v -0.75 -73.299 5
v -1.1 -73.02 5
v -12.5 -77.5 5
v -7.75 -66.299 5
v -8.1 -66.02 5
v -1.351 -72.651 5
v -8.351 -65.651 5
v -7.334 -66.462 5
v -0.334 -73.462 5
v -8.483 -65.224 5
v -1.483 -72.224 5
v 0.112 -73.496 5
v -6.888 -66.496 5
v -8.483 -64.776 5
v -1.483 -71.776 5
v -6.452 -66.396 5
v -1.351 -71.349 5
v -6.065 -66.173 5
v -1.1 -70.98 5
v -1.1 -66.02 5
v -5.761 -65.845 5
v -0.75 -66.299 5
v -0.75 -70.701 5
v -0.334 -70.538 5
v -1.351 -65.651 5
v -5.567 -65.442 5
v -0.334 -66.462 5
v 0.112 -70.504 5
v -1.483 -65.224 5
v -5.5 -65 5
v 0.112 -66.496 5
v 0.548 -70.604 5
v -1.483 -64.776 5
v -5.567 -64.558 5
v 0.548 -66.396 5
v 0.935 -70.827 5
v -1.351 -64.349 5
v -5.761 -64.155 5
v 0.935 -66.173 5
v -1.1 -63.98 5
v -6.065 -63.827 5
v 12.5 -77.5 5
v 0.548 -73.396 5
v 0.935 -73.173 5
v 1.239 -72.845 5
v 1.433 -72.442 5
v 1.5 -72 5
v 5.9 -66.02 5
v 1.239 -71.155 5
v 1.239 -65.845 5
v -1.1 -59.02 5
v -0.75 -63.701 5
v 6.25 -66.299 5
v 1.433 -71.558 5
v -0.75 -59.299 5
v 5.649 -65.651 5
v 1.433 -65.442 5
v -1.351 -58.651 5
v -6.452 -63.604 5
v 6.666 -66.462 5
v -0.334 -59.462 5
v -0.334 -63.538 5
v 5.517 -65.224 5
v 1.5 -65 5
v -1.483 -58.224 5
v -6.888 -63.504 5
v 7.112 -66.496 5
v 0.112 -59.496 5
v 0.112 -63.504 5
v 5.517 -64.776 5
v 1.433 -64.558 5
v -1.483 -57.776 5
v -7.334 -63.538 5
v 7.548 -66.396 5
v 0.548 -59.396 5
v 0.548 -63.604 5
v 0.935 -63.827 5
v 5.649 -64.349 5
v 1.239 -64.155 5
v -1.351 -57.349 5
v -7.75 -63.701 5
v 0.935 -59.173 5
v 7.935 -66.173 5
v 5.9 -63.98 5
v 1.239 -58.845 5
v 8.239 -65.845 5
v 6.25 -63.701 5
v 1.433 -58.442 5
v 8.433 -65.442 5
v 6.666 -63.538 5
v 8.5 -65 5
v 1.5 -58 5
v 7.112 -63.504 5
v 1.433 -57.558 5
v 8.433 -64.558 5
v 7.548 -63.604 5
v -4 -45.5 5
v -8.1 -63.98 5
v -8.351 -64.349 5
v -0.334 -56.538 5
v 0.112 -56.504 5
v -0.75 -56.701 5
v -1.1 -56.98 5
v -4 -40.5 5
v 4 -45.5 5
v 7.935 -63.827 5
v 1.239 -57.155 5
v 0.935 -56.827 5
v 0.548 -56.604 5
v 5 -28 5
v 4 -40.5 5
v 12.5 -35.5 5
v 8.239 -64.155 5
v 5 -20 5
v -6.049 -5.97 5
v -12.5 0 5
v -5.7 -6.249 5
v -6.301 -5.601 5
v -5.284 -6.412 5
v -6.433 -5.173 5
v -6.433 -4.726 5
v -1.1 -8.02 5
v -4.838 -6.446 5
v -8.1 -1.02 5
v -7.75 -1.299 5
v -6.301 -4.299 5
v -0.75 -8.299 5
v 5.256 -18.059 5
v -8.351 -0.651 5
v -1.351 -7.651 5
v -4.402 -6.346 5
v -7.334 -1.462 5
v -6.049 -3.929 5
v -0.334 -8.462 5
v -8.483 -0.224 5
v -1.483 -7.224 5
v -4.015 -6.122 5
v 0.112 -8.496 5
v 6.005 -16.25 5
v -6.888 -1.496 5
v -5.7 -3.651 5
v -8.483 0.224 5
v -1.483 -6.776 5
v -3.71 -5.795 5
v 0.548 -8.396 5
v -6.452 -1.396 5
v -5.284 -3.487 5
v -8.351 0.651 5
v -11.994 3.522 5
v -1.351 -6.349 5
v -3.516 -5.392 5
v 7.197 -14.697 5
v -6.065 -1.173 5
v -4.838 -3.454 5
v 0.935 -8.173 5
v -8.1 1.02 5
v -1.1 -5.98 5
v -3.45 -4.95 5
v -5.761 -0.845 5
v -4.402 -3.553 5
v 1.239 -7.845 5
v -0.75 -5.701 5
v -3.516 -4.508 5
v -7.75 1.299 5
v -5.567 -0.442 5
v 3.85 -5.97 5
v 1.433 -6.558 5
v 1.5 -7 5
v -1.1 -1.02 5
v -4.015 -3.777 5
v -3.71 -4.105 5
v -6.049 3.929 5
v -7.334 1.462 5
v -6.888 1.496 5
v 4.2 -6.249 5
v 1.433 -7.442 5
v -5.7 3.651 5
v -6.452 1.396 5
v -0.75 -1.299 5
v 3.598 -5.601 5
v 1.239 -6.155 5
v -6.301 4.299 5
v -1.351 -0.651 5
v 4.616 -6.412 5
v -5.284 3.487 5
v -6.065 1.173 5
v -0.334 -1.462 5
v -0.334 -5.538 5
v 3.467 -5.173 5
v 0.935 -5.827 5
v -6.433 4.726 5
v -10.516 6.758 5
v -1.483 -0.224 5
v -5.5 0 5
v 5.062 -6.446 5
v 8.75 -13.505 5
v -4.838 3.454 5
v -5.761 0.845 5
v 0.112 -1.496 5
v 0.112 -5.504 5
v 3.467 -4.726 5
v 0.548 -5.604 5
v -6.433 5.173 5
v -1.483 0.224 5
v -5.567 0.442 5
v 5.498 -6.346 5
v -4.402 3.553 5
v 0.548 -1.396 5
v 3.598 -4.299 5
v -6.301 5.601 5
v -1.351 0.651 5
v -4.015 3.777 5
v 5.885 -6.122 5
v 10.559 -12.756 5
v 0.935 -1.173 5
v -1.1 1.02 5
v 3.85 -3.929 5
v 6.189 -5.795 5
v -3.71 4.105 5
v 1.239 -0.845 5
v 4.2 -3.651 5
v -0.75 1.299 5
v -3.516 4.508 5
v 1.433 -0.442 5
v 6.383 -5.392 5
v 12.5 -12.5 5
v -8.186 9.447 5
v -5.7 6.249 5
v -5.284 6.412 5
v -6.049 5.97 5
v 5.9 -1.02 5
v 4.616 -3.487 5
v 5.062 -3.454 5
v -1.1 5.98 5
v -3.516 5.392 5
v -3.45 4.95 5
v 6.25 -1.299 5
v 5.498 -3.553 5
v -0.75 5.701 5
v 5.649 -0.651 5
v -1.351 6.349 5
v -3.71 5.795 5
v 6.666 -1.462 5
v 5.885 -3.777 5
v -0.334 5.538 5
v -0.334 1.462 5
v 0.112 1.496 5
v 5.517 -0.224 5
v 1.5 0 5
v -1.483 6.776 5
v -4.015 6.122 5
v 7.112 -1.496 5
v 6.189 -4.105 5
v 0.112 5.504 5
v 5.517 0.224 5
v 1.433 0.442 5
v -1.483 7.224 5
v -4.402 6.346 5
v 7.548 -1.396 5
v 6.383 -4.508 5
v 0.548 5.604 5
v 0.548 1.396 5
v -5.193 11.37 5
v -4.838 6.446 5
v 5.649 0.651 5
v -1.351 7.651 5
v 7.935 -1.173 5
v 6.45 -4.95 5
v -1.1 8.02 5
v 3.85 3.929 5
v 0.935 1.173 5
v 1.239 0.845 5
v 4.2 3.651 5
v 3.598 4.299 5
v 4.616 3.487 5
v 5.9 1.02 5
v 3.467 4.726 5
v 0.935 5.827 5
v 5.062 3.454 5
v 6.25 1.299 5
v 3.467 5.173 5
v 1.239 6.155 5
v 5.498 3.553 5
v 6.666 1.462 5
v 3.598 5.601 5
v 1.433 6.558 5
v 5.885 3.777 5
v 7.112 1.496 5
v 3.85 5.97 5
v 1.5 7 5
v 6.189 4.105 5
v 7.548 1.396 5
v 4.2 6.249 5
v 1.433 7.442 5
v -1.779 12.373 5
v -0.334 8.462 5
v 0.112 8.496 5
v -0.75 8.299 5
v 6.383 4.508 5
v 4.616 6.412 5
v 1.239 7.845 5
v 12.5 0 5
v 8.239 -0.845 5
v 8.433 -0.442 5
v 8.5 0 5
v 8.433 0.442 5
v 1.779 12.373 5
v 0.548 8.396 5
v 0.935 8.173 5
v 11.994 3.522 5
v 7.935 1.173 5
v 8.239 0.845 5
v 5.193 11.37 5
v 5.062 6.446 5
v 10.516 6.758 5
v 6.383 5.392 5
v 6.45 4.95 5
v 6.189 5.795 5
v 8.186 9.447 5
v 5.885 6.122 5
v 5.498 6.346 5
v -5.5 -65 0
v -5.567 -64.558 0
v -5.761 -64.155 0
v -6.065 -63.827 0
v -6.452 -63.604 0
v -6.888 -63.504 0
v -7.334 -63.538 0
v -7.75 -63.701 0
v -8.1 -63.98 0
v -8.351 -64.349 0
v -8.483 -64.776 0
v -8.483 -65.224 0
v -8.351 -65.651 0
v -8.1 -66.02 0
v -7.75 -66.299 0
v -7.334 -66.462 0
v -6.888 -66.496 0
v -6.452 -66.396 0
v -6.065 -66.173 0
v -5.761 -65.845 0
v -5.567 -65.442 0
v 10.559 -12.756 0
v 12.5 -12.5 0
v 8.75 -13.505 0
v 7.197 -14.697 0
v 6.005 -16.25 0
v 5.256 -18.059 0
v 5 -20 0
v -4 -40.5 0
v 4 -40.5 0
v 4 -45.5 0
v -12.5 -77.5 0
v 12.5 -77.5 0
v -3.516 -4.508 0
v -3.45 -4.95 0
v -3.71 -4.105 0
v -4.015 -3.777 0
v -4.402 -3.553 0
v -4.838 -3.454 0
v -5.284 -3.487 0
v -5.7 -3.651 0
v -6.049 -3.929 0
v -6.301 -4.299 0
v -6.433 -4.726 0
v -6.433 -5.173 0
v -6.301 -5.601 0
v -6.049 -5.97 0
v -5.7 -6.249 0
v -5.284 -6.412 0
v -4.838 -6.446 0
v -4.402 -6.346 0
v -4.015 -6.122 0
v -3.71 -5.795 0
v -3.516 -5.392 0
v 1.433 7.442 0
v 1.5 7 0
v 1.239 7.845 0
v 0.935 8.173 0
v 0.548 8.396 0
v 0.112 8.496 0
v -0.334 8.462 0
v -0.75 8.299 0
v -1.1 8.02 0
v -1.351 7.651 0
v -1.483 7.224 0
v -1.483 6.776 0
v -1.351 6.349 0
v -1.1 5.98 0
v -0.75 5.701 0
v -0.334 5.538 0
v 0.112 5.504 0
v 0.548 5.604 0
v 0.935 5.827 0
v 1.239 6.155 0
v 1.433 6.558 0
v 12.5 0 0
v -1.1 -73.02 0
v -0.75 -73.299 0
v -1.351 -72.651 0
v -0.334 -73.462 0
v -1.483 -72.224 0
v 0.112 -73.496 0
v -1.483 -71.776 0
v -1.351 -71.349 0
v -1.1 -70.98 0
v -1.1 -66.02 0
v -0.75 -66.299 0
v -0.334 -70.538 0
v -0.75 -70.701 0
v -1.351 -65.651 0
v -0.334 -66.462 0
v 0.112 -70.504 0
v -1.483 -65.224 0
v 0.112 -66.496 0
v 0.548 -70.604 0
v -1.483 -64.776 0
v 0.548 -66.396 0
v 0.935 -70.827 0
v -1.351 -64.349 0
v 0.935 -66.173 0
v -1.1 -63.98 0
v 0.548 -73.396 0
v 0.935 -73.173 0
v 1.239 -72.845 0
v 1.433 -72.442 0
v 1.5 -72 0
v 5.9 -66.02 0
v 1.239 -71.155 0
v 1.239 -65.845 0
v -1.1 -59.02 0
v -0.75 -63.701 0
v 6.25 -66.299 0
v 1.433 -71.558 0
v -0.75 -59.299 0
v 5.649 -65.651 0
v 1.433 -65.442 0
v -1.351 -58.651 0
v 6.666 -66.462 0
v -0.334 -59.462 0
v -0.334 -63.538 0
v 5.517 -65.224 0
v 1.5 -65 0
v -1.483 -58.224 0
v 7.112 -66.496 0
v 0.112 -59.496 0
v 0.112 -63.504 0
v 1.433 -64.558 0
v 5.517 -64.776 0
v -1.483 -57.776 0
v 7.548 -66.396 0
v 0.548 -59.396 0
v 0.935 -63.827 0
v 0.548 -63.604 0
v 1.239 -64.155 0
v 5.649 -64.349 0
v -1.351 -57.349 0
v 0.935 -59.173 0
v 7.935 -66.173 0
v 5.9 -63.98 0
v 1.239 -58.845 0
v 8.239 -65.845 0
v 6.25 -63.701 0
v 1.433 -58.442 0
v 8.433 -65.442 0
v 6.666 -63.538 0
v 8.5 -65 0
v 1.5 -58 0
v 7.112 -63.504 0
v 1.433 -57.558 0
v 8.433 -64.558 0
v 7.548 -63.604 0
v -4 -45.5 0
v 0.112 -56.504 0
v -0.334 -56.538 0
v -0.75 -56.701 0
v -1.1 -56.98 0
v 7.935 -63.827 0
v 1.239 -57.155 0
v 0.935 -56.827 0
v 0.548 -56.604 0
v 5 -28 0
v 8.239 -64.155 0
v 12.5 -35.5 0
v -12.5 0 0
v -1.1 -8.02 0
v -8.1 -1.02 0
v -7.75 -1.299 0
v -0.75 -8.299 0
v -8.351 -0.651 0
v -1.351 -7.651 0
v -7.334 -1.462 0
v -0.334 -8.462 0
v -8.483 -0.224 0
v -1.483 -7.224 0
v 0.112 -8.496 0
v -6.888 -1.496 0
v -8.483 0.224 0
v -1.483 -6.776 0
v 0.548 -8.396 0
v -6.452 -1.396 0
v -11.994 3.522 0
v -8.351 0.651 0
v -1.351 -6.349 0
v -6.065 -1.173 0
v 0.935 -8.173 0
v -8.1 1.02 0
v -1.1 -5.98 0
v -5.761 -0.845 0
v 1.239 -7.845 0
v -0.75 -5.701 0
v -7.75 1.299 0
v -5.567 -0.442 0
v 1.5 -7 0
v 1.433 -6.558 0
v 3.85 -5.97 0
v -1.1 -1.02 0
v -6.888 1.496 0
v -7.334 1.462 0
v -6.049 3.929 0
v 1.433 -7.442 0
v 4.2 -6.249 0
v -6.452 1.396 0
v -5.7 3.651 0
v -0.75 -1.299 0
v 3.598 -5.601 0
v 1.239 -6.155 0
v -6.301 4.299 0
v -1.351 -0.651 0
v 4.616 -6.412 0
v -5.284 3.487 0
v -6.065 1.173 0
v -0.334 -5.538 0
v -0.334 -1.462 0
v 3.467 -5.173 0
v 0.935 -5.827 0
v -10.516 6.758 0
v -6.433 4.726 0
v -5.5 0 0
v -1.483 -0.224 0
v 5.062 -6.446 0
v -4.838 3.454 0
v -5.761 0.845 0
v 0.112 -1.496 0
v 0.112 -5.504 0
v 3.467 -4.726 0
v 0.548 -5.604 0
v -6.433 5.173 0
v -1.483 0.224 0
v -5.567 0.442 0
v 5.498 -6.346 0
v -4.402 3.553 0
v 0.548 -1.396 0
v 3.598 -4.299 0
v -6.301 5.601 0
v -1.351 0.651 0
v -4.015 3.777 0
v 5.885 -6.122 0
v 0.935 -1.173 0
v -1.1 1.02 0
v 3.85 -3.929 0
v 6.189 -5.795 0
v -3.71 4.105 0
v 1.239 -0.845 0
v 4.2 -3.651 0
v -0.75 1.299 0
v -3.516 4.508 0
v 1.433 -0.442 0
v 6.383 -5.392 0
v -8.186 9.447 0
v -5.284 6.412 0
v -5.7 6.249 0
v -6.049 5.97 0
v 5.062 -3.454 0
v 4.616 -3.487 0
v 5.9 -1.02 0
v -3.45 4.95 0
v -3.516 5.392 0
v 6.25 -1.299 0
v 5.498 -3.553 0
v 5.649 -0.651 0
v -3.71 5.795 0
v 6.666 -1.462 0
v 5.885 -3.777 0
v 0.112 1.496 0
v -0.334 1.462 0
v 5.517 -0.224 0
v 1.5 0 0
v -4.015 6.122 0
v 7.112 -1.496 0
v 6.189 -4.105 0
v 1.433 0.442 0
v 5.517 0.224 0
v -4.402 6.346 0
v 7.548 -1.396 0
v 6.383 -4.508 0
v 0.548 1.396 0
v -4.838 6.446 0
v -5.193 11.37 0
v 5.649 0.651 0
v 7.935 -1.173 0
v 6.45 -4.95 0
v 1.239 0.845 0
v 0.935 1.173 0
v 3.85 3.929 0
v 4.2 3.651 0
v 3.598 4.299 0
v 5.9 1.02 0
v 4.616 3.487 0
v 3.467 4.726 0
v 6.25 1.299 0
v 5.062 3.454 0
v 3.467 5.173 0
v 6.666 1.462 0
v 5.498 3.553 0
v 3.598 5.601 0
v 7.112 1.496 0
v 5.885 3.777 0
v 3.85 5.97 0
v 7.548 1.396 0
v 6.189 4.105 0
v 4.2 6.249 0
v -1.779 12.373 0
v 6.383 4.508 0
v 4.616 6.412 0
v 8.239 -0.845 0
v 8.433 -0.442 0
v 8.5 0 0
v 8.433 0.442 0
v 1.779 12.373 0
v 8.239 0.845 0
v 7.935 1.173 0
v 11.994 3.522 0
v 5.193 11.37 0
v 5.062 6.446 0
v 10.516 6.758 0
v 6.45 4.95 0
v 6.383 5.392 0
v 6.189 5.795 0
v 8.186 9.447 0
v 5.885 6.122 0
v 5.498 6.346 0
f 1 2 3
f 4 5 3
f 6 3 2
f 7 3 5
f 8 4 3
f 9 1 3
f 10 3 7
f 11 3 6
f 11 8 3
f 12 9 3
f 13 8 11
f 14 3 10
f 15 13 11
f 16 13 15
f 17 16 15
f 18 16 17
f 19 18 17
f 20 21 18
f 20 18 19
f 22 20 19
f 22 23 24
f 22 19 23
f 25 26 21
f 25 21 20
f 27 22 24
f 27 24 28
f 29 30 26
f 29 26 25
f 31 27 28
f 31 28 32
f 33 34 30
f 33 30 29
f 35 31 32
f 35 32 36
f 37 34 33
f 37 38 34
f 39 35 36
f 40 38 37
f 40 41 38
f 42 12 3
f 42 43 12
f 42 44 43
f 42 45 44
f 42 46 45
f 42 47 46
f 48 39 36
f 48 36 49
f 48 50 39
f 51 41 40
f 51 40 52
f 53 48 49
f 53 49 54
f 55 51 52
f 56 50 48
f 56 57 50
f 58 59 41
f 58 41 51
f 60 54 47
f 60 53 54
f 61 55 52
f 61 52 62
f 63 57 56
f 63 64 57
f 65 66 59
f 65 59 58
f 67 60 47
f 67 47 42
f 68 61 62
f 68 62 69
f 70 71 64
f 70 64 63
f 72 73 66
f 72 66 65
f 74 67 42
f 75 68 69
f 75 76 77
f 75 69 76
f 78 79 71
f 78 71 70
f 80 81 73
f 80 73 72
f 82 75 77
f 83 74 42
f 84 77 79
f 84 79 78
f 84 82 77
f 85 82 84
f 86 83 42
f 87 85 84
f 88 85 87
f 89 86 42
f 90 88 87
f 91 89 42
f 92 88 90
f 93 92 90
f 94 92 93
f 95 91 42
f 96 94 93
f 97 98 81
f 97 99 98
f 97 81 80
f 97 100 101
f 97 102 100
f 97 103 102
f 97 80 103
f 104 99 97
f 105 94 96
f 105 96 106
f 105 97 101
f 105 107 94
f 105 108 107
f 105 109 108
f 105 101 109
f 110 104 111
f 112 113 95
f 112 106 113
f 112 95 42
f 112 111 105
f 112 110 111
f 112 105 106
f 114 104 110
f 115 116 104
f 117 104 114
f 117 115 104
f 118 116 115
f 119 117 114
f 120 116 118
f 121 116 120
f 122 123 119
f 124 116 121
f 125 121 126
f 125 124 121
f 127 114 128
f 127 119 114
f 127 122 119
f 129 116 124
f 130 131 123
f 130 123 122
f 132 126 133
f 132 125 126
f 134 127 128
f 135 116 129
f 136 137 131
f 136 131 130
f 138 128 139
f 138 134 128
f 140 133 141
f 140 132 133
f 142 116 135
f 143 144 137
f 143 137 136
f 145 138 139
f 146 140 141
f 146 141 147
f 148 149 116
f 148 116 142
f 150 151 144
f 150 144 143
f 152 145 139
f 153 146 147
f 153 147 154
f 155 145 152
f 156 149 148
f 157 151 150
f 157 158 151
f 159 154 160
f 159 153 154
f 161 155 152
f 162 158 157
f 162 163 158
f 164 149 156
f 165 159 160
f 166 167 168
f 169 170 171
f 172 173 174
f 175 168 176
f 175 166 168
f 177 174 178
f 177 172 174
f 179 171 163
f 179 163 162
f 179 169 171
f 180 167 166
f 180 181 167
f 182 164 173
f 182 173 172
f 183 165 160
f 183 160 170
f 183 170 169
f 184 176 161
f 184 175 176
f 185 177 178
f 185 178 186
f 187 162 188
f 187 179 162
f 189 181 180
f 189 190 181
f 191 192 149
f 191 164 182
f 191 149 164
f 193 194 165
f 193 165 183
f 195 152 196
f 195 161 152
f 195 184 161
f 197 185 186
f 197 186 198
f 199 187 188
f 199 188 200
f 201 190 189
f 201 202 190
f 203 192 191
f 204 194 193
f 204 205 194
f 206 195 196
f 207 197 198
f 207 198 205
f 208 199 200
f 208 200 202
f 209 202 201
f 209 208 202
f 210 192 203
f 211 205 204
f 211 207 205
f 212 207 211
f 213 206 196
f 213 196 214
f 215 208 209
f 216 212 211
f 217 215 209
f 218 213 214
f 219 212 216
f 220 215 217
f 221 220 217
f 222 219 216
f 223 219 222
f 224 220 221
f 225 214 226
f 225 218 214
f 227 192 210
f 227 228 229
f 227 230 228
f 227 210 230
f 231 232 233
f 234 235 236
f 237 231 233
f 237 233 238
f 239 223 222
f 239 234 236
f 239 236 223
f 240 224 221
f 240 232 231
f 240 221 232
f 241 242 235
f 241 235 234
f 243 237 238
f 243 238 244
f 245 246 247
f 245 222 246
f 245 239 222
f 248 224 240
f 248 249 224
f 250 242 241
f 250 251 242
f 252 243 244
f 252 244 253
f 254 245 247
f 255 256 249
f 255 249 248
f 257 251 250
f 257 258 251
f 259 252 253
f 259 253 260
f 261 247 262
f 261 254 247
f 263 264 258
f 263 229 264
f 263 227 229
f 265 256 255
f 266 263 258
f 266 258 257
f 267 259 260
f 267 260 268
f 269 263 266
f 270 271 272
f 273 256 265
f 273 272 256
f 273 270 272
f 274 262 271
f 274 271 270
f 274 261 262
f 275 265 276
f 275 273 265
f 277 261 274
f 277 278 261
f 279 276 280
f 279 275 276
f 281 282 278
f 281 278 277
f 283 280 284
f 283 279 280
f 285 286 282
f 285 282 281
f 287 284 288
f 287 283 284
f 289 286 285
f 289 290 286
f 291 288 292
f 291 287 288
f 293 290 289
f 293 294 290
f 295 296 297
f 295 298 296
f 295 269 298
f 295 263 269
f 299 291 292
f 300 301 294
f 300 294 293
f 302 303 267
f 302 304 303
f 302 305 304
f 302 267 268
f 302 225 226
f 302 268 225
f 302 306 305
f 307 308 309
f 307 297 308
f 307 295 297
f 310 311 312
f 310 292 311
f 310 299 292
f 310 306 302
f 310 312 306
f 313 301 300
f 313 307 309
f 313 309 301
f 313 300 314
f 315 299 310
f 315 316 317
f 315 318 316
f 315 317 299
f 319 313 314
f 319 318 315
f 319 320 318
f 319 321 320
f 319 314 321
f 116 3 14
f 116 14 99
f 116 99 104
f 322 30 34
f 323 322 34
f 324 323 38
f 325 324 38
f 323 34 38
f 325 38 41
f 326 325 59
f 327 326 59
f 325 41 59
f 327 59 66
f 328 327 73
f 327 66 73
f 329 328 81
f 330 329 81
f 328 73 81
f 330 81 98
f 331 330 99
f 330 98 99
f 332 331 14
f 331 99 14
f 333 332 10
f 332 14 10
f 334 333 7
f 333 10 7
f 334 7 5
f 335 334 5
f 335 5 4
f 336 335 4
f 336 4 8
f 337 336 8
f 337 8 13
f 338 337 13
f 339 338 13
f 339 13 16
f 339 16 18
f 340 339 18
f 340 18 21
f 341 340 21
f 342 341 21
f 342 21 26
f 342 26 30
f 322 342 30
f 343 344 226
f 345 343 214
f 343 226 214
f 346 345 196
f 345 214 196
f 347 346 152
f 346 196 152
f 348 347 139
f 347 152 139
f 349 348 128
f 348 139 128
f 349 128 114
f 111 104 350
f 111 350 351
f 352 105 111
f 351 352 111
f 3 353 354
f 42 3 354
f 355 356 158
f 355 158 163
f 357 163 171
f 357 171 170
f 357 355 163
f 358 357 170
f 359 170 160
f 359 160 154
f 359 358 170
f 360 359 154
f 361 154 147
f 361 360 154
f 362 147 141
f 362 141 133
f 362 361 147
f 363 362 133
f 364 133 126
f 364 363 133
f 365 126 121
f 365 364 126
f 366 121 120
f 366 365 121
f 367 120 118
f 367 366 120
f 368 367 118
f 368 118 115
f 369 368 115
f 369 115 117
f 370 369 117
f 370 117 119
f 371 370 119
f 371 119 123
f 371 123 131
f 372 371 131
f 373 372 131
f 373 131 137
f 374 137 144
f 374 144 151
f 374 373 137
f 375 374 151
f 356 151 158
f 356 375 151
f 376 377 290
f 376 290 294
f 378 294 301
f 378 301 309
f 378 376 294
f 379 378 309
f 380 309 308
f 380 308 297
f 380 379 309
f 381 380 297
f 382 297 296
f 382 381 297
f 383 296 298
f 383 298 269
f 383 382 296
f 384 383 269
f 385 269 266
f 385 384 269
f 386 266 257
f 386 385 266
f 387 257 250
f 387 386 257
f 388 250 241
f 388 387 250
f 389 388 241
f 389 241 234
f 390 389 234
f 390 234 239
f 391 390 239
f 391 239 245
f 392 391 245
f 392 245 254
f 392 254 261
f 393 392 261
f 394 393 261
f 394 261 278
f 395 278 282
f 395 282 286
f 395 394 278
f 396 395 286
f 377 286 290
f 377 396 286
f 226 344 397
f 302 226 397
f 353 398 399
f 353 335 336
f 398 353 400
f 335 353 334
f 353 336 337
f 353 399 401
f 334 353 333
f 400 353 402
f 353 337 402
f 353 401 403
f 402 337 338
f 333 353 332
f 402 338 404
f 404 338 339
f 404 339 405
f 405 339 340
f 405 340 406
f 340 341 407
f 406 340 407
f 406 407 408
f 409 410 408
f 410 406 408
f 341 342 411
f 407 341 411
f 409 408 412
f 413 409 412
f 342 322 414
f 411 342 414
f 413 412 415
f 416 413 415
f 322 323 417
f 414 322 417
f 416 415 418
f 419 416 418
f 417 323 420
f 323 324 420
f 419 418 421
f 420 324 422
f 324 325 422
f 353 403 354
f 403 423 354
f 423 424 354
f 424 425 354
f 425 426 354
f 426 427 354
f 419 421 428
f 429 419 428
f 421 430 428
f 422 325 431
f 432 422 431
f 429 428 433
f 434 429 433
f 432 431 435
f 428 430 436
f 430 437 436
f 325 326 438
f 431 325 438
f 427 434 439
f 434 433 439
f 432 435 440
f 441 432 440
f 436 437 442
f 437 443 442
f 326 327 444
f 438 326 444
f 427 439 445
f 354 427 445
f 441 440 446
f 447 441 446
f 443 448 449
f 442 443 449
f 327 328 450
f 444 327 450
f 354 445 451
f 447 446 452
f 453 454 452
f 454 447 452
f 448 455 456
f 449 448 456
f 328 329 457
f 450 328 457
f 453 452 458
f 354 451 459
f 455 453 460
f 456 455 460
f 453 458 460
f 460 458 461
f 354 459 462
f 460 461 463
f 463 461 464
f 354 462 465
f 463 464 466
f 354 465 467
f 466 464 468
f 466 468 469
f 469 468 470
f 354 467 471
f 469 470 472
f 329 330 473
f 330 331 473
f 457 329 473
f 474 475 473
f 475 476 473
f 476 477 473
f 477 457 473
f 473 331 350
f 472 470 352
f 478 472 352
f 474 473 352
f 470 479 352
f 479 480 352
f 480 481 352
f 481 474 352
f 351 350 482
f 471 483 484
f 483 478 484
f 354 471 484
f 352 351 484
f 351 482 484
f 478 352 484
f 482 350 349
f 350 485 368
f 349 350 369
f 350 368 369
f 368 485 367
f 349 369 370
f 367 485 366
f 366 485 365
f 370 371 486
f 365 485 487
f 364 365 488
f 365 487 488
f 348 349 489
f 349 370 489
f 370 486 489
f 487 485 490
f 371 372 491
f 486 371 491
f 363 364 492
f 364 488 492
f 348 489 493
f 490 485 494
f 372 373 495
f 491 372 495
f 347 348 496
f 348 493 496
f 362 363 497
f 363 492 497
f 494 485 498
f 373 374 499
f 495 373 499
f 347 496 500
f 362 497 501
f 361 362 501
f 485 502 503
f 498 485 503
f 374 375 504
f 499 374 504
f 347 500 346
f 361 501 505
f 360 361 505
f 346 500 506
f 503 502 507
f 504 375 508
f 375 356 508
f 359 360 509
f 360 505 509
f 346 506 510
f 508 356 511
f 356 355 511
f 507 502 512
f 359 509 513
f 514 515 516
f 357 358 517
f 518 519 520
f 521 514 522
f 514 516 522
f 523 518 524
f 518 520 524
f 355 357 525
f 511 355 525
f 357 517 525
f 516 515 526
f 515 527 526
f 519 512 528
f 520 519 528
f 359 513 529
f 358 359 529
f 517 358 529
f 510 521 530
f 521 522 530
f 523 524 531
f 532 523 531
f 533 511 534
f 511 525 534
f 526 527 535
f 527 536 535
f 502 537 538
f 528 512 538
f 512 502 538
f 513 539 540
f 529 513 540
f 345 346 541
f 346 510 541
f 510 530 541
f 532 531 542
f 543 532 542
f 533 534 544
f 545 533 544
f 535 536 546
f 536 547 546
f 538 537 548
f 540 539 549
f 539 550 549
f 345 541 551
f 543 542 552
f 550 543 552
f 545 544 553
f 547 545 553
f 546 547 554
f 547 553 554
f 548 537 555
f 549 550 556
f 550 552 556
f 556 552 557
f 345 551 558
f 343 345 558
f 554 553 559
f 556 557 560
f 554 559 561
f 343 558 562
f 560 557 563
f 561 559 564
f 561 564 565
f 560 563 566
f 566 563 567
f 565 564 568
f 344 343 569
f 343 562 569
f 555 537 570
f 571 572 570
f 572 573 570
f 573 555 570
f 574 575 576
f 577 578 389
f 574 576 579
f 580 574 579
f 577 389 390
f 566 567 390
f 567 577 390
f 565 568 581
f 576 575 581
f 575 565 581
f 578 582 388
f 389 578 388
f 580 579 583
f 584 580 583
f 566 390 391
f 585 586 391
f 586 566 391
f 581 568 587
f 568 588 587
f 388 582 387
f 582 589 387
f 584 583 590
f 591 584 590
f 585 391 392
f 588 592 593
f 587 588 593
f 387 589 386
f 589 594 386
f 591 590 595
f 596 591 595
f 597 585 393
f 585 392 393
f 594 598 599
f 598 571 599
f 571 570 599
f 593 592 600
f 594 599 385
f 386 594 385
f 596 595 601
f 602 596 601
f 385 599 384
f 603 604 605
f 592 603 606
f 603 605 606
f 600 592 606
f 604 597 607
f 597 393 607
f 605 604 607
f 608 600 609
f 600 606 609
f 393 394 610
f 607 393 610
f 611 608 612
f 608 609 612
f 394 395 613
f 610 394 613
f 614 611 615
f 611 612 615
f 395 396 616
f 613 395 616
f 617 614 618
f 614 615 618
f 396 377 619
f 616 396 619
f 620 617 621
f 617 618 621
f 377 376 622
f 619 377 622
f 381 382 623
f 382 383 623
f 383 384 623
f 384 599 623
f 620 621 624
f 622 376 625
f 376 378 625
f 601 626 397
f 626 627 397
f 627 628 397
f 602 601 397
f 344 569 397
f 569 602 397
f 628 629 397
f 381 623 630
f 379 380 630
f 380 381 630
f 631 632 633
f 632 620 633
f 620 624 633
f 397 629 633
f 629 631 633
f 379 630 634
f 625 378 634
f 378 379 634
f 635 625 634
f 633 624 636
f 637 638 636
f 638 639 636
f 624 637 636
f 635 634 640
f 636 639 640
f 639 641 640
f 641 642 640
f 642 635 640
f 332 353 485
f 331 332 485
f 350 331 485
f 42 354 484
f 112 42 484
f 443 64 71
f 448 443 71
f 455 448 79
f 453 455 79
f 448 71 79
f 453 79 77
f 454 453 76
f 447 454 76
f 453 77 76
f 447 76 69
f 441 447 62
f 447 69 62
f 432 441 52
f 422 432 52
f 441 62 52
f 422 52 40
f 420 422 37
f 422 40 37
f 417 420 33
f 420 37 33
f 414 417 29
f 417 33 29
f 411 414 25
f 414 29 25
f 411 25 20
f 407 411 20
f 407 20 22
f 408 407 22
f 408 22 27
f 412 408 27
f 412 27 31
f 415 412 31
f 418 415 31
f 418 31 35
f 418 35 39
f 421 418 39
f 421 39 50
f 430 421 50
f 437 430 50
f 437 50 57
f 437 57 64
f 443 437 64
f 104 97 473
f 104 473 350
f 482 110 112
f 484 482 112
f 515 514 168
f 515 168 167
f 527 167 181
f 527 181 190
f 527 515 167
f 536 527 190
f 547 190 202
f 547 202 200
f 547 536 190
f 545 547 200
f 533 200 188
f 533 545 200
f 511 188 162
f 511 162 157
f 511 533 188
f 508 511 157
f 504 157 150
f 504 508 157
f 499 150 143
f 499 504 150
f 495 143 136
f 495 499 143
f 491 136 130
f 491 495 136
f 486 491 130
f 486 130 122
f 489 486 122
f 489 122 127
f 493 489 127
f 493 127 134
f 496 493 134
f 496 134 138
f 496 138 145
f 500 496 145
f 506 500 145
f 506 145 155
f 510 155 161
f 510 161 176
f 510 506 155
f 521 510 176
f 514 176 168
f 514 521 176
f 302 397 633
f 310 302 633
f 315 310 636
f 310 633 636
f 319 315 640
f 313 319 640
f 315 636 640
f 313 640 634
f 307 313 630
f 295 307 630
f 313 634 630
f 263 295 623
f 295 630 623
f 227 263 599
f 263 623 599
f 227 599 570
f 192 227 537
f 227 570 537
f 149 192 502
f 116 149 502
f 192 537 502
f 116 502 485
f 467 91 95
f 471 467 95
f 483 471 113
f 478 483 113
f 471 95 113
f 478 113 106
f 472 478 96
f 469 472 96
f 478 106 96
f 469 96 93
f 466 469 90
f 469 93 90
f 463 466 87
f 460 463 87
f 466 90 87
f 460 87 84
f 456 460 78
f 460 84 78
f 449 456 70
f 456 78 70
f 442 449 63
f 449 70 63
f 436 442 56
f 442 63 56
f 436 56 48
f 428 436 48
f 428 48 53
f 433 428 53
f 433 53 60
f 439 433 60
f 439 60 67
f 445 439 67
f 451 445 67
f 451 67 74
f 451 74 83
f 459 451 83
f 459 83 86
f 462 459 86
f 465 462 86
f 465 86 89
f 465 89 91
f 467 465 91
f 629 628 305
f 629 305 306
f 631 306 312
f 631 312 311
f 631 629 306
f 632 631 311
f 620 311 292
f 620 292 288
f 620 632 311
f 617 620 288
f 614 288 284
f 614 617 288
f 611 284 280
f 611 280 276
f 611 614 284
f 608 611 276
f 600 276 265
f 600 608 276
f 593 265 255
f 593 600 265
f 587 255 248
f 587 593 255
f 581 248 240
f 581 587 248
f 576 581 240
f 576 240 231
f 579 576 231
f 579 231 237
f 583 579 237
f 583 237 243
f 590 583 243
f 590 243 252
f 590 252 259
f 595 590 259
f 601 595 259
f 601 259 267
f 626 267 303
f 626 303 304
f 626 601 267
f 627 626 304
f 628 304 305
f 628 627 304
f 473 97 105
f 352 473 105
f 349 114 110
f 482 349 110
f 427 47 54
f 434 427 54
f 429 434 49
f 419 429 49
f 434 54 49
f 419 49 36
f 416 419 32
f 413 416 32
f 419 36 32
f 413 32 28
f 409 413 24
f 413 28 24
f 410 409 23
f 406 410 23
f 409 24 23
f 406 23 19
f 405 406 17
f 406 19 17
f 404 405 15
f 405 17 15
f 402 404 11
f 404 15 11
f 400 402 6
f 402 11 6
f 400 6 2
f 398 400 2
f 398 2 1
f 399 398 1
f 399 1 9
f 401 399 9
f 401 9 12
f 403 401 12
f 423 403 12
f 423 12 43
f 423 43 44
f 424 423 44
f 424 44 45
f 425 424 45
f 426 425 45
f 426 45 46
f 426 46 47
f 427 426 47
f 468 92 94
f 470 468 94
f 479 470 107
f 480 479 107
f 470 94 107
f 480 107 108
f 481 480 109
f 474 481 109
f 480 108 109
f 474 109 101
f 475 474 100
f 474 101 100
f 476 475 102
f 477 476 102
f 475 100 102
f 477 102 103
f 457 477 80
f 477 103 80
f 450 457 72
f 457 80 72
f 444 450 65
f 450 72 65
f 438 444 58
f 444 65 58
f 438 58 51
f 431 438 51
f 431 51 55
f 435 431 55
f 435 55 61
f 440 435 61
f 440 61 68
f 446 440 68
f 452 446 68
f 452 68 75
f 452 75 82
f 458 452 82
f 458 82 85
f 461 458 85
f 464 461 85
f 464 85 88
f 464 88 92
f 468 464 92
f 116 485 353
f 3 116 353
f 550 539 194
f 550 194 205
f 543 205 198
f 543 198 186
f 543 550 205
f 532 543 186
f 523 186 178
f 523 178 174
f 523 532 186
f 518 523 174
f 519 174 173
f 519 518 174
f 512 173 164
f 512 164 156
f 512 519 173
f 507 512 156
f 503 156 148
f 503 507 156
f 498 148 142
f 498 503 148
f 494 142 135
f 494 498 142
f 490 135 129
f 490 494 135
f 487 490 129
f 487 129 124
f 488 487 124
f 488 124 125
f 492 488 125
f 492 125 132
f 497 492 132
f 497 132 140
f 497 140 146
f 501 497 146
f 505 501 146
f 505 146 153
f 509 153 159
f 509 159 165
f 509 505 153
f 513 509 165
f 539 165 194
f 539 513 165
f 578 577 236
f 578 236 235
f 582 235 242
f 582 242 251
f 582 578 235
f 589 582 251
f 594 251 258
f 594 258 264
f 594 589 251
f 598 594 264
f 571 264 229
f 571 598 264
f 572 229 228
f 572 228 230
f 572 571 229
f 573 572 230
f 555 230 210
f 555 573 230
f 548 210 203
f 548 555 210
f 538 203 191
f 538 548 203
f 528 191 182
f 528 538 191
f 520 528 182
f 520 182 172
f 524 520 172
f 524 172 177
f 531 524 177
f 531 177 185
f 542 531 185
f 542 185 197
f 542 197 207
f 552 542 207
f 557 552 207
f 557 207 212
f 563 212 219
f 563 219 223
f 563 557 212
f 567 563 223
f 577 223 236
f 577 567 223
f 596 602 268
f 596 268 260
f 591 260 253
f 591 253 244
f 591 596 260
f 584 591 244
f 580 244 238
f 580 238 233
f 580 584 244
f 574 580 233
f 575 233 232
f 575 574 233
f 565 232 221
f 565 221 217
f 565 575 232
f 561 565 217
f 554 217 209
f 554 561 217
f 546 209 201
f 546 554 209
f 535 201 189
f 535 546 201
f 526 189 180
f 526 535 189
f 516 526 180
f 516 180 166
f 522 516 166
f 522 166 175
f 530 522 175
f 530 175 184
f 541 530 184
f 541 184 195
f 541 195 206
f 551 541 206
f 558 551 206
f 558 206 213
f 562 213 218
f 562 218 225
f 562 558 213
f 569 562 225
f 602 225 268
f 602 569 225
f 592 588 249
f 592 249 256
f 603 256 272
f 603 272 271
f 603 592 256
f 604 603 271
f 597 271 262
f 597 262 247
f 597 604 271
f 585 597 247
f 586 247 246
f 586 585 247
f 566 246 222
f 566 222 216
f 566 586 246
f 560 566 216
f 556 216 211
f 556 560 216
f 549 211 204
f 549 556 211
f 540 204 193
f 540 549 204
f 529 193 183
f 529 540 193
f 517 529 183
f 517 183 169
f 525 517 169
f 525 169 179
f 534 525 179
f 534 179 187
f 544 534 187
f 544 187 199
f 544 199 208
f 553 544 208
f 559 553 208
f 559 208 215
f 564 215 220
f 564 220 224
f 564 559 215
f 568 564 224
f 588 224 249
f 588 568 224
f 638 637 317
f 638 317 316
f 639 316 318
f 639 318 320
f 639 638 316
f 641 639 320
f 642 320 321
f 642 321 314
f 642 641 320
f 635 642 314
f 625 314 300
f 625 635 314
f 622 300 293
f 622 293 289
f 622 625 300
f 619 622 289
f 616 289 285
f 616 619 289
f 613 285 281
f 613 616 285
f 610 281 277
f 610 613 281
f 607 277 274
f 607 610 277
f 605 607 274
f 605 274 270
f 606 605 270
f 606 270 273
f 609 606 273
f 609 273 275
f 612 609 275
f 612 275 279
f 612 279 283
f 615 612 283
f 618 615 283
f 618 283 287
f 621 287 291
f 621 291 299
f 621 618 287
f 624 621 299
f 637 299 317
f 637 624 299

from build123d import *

# Parameters (mm, degrees)
SKETCH1_R           = 1.5
BOSS_EXTRUDE1_DEPTH = 5
SKETCH2_W           = 8
SKETCH2_H           = 5
CUT_EXTRUDE1_DEPTH  = 10
SKETCH3_R           = 1.5
CUT_EXTRUDE2_DEPTH  = 10
CUT_EXTRUDE4_DEPTH  = 10


with BuildPart() as part:
    # Sketch1 → Boss-Extrude1 (new body)
    with BuildSketch(Plane.XY):
        with BuildLine():
            Line((-12.5, 0), (-12.5, -77.5))
            Line((-12.5, -77.5), (12.5, -77.5))
            Line((12.5, -77.5), (12.5, 0))
            ThreePointArc((12.5, 0), (0, 12.5), (-12.5, 0))
        make_face()
        Circle(SKETCH1_R, mode=Mode.SUBTRACT)
        with Locations((0, 7)):
            Circle(SKETCH1_R, mode=Mode.SUBTRACT)
        with Locations((4.949747468, 4.949747468)):
            Circle(SKETCH1_R, mode=Mode.SUBTRACT)
        with Locations((7, 0)):
            Circle(SKETCH1_R, mode=Mode.SUBTRACT)
        with Locations((4.949747468, -4.949747468)):
            Circle(SKETCH1_R, mode=Mode.SUBTRACT)
        with Locations((0, -7)):
            Circle(SKETCH1_R, mode=Mode.SUBTRACT)
        with Locations((-4.949747468, -4.949747468)):
            Circle(SKETCH1_R, mode=Mode.SUBTRACT)
        with Locations((-7, 0)):
            Circle(SKETCH1_R, mode=Mode.SUBTRACT)
        with Locations((-4.949747468, 4.949747468)):
            Circle(SKETCH1_R, mode=Mode.SUBTRACT)
    extrude(amount=BOSS_EXTRUDE1_DEPTH)

    # Sketch2 → Cut-Extrude1 (cut)
    with BuildSketch(Plane.XY.offset(5)):
        with Locations((0, -43)):
            Rectangle(SKETCH2_W, SKETCH2_H)
    extrude(amount=-CUT_EXTRUDE1_DEPTH, mode=Mode.SUBTRACT)

    # Sketch3 → Cut-Extrude2 (cut)
    with BuildSketch(Plane.XY.offset(5)):
        with Locations((0, -65)):
            Circle(SKETCH3_R)
        with Locations((0, -58)):
            Circle(SKETCH3_R)
        with Locations((-7, -65)):
            Circle(SKETCH3_R)
        with Locations((7, -65)):
            Circle(SKETCH3_R)
        with Locations((0, -72)):
            Circle(SKETCH3_R)
    extrude(amount=-CUT_EXTRUDE2_DEPTH, mode=Mode.SUBTRACT)

    # Sketch4 → Cut-Extrude4 (cut)
    with BuildSketch(Plane.XY.offset(5)):
        with BuildLine():
            Line((5, -20), (5, -28))
            Line((5, -28), (12.5, -35.5))
            Line((12.5, -35.5), (12.5, -27.5))
            ThreePointArc((12.5, -27.5), (17.803300859, -14.696699141), (5, -20))
        make_face()
    extrude(amount=-CUT_EXTRUDE4_DEPTH, mode=Mode.SUBTRACT)


solid = part.part
